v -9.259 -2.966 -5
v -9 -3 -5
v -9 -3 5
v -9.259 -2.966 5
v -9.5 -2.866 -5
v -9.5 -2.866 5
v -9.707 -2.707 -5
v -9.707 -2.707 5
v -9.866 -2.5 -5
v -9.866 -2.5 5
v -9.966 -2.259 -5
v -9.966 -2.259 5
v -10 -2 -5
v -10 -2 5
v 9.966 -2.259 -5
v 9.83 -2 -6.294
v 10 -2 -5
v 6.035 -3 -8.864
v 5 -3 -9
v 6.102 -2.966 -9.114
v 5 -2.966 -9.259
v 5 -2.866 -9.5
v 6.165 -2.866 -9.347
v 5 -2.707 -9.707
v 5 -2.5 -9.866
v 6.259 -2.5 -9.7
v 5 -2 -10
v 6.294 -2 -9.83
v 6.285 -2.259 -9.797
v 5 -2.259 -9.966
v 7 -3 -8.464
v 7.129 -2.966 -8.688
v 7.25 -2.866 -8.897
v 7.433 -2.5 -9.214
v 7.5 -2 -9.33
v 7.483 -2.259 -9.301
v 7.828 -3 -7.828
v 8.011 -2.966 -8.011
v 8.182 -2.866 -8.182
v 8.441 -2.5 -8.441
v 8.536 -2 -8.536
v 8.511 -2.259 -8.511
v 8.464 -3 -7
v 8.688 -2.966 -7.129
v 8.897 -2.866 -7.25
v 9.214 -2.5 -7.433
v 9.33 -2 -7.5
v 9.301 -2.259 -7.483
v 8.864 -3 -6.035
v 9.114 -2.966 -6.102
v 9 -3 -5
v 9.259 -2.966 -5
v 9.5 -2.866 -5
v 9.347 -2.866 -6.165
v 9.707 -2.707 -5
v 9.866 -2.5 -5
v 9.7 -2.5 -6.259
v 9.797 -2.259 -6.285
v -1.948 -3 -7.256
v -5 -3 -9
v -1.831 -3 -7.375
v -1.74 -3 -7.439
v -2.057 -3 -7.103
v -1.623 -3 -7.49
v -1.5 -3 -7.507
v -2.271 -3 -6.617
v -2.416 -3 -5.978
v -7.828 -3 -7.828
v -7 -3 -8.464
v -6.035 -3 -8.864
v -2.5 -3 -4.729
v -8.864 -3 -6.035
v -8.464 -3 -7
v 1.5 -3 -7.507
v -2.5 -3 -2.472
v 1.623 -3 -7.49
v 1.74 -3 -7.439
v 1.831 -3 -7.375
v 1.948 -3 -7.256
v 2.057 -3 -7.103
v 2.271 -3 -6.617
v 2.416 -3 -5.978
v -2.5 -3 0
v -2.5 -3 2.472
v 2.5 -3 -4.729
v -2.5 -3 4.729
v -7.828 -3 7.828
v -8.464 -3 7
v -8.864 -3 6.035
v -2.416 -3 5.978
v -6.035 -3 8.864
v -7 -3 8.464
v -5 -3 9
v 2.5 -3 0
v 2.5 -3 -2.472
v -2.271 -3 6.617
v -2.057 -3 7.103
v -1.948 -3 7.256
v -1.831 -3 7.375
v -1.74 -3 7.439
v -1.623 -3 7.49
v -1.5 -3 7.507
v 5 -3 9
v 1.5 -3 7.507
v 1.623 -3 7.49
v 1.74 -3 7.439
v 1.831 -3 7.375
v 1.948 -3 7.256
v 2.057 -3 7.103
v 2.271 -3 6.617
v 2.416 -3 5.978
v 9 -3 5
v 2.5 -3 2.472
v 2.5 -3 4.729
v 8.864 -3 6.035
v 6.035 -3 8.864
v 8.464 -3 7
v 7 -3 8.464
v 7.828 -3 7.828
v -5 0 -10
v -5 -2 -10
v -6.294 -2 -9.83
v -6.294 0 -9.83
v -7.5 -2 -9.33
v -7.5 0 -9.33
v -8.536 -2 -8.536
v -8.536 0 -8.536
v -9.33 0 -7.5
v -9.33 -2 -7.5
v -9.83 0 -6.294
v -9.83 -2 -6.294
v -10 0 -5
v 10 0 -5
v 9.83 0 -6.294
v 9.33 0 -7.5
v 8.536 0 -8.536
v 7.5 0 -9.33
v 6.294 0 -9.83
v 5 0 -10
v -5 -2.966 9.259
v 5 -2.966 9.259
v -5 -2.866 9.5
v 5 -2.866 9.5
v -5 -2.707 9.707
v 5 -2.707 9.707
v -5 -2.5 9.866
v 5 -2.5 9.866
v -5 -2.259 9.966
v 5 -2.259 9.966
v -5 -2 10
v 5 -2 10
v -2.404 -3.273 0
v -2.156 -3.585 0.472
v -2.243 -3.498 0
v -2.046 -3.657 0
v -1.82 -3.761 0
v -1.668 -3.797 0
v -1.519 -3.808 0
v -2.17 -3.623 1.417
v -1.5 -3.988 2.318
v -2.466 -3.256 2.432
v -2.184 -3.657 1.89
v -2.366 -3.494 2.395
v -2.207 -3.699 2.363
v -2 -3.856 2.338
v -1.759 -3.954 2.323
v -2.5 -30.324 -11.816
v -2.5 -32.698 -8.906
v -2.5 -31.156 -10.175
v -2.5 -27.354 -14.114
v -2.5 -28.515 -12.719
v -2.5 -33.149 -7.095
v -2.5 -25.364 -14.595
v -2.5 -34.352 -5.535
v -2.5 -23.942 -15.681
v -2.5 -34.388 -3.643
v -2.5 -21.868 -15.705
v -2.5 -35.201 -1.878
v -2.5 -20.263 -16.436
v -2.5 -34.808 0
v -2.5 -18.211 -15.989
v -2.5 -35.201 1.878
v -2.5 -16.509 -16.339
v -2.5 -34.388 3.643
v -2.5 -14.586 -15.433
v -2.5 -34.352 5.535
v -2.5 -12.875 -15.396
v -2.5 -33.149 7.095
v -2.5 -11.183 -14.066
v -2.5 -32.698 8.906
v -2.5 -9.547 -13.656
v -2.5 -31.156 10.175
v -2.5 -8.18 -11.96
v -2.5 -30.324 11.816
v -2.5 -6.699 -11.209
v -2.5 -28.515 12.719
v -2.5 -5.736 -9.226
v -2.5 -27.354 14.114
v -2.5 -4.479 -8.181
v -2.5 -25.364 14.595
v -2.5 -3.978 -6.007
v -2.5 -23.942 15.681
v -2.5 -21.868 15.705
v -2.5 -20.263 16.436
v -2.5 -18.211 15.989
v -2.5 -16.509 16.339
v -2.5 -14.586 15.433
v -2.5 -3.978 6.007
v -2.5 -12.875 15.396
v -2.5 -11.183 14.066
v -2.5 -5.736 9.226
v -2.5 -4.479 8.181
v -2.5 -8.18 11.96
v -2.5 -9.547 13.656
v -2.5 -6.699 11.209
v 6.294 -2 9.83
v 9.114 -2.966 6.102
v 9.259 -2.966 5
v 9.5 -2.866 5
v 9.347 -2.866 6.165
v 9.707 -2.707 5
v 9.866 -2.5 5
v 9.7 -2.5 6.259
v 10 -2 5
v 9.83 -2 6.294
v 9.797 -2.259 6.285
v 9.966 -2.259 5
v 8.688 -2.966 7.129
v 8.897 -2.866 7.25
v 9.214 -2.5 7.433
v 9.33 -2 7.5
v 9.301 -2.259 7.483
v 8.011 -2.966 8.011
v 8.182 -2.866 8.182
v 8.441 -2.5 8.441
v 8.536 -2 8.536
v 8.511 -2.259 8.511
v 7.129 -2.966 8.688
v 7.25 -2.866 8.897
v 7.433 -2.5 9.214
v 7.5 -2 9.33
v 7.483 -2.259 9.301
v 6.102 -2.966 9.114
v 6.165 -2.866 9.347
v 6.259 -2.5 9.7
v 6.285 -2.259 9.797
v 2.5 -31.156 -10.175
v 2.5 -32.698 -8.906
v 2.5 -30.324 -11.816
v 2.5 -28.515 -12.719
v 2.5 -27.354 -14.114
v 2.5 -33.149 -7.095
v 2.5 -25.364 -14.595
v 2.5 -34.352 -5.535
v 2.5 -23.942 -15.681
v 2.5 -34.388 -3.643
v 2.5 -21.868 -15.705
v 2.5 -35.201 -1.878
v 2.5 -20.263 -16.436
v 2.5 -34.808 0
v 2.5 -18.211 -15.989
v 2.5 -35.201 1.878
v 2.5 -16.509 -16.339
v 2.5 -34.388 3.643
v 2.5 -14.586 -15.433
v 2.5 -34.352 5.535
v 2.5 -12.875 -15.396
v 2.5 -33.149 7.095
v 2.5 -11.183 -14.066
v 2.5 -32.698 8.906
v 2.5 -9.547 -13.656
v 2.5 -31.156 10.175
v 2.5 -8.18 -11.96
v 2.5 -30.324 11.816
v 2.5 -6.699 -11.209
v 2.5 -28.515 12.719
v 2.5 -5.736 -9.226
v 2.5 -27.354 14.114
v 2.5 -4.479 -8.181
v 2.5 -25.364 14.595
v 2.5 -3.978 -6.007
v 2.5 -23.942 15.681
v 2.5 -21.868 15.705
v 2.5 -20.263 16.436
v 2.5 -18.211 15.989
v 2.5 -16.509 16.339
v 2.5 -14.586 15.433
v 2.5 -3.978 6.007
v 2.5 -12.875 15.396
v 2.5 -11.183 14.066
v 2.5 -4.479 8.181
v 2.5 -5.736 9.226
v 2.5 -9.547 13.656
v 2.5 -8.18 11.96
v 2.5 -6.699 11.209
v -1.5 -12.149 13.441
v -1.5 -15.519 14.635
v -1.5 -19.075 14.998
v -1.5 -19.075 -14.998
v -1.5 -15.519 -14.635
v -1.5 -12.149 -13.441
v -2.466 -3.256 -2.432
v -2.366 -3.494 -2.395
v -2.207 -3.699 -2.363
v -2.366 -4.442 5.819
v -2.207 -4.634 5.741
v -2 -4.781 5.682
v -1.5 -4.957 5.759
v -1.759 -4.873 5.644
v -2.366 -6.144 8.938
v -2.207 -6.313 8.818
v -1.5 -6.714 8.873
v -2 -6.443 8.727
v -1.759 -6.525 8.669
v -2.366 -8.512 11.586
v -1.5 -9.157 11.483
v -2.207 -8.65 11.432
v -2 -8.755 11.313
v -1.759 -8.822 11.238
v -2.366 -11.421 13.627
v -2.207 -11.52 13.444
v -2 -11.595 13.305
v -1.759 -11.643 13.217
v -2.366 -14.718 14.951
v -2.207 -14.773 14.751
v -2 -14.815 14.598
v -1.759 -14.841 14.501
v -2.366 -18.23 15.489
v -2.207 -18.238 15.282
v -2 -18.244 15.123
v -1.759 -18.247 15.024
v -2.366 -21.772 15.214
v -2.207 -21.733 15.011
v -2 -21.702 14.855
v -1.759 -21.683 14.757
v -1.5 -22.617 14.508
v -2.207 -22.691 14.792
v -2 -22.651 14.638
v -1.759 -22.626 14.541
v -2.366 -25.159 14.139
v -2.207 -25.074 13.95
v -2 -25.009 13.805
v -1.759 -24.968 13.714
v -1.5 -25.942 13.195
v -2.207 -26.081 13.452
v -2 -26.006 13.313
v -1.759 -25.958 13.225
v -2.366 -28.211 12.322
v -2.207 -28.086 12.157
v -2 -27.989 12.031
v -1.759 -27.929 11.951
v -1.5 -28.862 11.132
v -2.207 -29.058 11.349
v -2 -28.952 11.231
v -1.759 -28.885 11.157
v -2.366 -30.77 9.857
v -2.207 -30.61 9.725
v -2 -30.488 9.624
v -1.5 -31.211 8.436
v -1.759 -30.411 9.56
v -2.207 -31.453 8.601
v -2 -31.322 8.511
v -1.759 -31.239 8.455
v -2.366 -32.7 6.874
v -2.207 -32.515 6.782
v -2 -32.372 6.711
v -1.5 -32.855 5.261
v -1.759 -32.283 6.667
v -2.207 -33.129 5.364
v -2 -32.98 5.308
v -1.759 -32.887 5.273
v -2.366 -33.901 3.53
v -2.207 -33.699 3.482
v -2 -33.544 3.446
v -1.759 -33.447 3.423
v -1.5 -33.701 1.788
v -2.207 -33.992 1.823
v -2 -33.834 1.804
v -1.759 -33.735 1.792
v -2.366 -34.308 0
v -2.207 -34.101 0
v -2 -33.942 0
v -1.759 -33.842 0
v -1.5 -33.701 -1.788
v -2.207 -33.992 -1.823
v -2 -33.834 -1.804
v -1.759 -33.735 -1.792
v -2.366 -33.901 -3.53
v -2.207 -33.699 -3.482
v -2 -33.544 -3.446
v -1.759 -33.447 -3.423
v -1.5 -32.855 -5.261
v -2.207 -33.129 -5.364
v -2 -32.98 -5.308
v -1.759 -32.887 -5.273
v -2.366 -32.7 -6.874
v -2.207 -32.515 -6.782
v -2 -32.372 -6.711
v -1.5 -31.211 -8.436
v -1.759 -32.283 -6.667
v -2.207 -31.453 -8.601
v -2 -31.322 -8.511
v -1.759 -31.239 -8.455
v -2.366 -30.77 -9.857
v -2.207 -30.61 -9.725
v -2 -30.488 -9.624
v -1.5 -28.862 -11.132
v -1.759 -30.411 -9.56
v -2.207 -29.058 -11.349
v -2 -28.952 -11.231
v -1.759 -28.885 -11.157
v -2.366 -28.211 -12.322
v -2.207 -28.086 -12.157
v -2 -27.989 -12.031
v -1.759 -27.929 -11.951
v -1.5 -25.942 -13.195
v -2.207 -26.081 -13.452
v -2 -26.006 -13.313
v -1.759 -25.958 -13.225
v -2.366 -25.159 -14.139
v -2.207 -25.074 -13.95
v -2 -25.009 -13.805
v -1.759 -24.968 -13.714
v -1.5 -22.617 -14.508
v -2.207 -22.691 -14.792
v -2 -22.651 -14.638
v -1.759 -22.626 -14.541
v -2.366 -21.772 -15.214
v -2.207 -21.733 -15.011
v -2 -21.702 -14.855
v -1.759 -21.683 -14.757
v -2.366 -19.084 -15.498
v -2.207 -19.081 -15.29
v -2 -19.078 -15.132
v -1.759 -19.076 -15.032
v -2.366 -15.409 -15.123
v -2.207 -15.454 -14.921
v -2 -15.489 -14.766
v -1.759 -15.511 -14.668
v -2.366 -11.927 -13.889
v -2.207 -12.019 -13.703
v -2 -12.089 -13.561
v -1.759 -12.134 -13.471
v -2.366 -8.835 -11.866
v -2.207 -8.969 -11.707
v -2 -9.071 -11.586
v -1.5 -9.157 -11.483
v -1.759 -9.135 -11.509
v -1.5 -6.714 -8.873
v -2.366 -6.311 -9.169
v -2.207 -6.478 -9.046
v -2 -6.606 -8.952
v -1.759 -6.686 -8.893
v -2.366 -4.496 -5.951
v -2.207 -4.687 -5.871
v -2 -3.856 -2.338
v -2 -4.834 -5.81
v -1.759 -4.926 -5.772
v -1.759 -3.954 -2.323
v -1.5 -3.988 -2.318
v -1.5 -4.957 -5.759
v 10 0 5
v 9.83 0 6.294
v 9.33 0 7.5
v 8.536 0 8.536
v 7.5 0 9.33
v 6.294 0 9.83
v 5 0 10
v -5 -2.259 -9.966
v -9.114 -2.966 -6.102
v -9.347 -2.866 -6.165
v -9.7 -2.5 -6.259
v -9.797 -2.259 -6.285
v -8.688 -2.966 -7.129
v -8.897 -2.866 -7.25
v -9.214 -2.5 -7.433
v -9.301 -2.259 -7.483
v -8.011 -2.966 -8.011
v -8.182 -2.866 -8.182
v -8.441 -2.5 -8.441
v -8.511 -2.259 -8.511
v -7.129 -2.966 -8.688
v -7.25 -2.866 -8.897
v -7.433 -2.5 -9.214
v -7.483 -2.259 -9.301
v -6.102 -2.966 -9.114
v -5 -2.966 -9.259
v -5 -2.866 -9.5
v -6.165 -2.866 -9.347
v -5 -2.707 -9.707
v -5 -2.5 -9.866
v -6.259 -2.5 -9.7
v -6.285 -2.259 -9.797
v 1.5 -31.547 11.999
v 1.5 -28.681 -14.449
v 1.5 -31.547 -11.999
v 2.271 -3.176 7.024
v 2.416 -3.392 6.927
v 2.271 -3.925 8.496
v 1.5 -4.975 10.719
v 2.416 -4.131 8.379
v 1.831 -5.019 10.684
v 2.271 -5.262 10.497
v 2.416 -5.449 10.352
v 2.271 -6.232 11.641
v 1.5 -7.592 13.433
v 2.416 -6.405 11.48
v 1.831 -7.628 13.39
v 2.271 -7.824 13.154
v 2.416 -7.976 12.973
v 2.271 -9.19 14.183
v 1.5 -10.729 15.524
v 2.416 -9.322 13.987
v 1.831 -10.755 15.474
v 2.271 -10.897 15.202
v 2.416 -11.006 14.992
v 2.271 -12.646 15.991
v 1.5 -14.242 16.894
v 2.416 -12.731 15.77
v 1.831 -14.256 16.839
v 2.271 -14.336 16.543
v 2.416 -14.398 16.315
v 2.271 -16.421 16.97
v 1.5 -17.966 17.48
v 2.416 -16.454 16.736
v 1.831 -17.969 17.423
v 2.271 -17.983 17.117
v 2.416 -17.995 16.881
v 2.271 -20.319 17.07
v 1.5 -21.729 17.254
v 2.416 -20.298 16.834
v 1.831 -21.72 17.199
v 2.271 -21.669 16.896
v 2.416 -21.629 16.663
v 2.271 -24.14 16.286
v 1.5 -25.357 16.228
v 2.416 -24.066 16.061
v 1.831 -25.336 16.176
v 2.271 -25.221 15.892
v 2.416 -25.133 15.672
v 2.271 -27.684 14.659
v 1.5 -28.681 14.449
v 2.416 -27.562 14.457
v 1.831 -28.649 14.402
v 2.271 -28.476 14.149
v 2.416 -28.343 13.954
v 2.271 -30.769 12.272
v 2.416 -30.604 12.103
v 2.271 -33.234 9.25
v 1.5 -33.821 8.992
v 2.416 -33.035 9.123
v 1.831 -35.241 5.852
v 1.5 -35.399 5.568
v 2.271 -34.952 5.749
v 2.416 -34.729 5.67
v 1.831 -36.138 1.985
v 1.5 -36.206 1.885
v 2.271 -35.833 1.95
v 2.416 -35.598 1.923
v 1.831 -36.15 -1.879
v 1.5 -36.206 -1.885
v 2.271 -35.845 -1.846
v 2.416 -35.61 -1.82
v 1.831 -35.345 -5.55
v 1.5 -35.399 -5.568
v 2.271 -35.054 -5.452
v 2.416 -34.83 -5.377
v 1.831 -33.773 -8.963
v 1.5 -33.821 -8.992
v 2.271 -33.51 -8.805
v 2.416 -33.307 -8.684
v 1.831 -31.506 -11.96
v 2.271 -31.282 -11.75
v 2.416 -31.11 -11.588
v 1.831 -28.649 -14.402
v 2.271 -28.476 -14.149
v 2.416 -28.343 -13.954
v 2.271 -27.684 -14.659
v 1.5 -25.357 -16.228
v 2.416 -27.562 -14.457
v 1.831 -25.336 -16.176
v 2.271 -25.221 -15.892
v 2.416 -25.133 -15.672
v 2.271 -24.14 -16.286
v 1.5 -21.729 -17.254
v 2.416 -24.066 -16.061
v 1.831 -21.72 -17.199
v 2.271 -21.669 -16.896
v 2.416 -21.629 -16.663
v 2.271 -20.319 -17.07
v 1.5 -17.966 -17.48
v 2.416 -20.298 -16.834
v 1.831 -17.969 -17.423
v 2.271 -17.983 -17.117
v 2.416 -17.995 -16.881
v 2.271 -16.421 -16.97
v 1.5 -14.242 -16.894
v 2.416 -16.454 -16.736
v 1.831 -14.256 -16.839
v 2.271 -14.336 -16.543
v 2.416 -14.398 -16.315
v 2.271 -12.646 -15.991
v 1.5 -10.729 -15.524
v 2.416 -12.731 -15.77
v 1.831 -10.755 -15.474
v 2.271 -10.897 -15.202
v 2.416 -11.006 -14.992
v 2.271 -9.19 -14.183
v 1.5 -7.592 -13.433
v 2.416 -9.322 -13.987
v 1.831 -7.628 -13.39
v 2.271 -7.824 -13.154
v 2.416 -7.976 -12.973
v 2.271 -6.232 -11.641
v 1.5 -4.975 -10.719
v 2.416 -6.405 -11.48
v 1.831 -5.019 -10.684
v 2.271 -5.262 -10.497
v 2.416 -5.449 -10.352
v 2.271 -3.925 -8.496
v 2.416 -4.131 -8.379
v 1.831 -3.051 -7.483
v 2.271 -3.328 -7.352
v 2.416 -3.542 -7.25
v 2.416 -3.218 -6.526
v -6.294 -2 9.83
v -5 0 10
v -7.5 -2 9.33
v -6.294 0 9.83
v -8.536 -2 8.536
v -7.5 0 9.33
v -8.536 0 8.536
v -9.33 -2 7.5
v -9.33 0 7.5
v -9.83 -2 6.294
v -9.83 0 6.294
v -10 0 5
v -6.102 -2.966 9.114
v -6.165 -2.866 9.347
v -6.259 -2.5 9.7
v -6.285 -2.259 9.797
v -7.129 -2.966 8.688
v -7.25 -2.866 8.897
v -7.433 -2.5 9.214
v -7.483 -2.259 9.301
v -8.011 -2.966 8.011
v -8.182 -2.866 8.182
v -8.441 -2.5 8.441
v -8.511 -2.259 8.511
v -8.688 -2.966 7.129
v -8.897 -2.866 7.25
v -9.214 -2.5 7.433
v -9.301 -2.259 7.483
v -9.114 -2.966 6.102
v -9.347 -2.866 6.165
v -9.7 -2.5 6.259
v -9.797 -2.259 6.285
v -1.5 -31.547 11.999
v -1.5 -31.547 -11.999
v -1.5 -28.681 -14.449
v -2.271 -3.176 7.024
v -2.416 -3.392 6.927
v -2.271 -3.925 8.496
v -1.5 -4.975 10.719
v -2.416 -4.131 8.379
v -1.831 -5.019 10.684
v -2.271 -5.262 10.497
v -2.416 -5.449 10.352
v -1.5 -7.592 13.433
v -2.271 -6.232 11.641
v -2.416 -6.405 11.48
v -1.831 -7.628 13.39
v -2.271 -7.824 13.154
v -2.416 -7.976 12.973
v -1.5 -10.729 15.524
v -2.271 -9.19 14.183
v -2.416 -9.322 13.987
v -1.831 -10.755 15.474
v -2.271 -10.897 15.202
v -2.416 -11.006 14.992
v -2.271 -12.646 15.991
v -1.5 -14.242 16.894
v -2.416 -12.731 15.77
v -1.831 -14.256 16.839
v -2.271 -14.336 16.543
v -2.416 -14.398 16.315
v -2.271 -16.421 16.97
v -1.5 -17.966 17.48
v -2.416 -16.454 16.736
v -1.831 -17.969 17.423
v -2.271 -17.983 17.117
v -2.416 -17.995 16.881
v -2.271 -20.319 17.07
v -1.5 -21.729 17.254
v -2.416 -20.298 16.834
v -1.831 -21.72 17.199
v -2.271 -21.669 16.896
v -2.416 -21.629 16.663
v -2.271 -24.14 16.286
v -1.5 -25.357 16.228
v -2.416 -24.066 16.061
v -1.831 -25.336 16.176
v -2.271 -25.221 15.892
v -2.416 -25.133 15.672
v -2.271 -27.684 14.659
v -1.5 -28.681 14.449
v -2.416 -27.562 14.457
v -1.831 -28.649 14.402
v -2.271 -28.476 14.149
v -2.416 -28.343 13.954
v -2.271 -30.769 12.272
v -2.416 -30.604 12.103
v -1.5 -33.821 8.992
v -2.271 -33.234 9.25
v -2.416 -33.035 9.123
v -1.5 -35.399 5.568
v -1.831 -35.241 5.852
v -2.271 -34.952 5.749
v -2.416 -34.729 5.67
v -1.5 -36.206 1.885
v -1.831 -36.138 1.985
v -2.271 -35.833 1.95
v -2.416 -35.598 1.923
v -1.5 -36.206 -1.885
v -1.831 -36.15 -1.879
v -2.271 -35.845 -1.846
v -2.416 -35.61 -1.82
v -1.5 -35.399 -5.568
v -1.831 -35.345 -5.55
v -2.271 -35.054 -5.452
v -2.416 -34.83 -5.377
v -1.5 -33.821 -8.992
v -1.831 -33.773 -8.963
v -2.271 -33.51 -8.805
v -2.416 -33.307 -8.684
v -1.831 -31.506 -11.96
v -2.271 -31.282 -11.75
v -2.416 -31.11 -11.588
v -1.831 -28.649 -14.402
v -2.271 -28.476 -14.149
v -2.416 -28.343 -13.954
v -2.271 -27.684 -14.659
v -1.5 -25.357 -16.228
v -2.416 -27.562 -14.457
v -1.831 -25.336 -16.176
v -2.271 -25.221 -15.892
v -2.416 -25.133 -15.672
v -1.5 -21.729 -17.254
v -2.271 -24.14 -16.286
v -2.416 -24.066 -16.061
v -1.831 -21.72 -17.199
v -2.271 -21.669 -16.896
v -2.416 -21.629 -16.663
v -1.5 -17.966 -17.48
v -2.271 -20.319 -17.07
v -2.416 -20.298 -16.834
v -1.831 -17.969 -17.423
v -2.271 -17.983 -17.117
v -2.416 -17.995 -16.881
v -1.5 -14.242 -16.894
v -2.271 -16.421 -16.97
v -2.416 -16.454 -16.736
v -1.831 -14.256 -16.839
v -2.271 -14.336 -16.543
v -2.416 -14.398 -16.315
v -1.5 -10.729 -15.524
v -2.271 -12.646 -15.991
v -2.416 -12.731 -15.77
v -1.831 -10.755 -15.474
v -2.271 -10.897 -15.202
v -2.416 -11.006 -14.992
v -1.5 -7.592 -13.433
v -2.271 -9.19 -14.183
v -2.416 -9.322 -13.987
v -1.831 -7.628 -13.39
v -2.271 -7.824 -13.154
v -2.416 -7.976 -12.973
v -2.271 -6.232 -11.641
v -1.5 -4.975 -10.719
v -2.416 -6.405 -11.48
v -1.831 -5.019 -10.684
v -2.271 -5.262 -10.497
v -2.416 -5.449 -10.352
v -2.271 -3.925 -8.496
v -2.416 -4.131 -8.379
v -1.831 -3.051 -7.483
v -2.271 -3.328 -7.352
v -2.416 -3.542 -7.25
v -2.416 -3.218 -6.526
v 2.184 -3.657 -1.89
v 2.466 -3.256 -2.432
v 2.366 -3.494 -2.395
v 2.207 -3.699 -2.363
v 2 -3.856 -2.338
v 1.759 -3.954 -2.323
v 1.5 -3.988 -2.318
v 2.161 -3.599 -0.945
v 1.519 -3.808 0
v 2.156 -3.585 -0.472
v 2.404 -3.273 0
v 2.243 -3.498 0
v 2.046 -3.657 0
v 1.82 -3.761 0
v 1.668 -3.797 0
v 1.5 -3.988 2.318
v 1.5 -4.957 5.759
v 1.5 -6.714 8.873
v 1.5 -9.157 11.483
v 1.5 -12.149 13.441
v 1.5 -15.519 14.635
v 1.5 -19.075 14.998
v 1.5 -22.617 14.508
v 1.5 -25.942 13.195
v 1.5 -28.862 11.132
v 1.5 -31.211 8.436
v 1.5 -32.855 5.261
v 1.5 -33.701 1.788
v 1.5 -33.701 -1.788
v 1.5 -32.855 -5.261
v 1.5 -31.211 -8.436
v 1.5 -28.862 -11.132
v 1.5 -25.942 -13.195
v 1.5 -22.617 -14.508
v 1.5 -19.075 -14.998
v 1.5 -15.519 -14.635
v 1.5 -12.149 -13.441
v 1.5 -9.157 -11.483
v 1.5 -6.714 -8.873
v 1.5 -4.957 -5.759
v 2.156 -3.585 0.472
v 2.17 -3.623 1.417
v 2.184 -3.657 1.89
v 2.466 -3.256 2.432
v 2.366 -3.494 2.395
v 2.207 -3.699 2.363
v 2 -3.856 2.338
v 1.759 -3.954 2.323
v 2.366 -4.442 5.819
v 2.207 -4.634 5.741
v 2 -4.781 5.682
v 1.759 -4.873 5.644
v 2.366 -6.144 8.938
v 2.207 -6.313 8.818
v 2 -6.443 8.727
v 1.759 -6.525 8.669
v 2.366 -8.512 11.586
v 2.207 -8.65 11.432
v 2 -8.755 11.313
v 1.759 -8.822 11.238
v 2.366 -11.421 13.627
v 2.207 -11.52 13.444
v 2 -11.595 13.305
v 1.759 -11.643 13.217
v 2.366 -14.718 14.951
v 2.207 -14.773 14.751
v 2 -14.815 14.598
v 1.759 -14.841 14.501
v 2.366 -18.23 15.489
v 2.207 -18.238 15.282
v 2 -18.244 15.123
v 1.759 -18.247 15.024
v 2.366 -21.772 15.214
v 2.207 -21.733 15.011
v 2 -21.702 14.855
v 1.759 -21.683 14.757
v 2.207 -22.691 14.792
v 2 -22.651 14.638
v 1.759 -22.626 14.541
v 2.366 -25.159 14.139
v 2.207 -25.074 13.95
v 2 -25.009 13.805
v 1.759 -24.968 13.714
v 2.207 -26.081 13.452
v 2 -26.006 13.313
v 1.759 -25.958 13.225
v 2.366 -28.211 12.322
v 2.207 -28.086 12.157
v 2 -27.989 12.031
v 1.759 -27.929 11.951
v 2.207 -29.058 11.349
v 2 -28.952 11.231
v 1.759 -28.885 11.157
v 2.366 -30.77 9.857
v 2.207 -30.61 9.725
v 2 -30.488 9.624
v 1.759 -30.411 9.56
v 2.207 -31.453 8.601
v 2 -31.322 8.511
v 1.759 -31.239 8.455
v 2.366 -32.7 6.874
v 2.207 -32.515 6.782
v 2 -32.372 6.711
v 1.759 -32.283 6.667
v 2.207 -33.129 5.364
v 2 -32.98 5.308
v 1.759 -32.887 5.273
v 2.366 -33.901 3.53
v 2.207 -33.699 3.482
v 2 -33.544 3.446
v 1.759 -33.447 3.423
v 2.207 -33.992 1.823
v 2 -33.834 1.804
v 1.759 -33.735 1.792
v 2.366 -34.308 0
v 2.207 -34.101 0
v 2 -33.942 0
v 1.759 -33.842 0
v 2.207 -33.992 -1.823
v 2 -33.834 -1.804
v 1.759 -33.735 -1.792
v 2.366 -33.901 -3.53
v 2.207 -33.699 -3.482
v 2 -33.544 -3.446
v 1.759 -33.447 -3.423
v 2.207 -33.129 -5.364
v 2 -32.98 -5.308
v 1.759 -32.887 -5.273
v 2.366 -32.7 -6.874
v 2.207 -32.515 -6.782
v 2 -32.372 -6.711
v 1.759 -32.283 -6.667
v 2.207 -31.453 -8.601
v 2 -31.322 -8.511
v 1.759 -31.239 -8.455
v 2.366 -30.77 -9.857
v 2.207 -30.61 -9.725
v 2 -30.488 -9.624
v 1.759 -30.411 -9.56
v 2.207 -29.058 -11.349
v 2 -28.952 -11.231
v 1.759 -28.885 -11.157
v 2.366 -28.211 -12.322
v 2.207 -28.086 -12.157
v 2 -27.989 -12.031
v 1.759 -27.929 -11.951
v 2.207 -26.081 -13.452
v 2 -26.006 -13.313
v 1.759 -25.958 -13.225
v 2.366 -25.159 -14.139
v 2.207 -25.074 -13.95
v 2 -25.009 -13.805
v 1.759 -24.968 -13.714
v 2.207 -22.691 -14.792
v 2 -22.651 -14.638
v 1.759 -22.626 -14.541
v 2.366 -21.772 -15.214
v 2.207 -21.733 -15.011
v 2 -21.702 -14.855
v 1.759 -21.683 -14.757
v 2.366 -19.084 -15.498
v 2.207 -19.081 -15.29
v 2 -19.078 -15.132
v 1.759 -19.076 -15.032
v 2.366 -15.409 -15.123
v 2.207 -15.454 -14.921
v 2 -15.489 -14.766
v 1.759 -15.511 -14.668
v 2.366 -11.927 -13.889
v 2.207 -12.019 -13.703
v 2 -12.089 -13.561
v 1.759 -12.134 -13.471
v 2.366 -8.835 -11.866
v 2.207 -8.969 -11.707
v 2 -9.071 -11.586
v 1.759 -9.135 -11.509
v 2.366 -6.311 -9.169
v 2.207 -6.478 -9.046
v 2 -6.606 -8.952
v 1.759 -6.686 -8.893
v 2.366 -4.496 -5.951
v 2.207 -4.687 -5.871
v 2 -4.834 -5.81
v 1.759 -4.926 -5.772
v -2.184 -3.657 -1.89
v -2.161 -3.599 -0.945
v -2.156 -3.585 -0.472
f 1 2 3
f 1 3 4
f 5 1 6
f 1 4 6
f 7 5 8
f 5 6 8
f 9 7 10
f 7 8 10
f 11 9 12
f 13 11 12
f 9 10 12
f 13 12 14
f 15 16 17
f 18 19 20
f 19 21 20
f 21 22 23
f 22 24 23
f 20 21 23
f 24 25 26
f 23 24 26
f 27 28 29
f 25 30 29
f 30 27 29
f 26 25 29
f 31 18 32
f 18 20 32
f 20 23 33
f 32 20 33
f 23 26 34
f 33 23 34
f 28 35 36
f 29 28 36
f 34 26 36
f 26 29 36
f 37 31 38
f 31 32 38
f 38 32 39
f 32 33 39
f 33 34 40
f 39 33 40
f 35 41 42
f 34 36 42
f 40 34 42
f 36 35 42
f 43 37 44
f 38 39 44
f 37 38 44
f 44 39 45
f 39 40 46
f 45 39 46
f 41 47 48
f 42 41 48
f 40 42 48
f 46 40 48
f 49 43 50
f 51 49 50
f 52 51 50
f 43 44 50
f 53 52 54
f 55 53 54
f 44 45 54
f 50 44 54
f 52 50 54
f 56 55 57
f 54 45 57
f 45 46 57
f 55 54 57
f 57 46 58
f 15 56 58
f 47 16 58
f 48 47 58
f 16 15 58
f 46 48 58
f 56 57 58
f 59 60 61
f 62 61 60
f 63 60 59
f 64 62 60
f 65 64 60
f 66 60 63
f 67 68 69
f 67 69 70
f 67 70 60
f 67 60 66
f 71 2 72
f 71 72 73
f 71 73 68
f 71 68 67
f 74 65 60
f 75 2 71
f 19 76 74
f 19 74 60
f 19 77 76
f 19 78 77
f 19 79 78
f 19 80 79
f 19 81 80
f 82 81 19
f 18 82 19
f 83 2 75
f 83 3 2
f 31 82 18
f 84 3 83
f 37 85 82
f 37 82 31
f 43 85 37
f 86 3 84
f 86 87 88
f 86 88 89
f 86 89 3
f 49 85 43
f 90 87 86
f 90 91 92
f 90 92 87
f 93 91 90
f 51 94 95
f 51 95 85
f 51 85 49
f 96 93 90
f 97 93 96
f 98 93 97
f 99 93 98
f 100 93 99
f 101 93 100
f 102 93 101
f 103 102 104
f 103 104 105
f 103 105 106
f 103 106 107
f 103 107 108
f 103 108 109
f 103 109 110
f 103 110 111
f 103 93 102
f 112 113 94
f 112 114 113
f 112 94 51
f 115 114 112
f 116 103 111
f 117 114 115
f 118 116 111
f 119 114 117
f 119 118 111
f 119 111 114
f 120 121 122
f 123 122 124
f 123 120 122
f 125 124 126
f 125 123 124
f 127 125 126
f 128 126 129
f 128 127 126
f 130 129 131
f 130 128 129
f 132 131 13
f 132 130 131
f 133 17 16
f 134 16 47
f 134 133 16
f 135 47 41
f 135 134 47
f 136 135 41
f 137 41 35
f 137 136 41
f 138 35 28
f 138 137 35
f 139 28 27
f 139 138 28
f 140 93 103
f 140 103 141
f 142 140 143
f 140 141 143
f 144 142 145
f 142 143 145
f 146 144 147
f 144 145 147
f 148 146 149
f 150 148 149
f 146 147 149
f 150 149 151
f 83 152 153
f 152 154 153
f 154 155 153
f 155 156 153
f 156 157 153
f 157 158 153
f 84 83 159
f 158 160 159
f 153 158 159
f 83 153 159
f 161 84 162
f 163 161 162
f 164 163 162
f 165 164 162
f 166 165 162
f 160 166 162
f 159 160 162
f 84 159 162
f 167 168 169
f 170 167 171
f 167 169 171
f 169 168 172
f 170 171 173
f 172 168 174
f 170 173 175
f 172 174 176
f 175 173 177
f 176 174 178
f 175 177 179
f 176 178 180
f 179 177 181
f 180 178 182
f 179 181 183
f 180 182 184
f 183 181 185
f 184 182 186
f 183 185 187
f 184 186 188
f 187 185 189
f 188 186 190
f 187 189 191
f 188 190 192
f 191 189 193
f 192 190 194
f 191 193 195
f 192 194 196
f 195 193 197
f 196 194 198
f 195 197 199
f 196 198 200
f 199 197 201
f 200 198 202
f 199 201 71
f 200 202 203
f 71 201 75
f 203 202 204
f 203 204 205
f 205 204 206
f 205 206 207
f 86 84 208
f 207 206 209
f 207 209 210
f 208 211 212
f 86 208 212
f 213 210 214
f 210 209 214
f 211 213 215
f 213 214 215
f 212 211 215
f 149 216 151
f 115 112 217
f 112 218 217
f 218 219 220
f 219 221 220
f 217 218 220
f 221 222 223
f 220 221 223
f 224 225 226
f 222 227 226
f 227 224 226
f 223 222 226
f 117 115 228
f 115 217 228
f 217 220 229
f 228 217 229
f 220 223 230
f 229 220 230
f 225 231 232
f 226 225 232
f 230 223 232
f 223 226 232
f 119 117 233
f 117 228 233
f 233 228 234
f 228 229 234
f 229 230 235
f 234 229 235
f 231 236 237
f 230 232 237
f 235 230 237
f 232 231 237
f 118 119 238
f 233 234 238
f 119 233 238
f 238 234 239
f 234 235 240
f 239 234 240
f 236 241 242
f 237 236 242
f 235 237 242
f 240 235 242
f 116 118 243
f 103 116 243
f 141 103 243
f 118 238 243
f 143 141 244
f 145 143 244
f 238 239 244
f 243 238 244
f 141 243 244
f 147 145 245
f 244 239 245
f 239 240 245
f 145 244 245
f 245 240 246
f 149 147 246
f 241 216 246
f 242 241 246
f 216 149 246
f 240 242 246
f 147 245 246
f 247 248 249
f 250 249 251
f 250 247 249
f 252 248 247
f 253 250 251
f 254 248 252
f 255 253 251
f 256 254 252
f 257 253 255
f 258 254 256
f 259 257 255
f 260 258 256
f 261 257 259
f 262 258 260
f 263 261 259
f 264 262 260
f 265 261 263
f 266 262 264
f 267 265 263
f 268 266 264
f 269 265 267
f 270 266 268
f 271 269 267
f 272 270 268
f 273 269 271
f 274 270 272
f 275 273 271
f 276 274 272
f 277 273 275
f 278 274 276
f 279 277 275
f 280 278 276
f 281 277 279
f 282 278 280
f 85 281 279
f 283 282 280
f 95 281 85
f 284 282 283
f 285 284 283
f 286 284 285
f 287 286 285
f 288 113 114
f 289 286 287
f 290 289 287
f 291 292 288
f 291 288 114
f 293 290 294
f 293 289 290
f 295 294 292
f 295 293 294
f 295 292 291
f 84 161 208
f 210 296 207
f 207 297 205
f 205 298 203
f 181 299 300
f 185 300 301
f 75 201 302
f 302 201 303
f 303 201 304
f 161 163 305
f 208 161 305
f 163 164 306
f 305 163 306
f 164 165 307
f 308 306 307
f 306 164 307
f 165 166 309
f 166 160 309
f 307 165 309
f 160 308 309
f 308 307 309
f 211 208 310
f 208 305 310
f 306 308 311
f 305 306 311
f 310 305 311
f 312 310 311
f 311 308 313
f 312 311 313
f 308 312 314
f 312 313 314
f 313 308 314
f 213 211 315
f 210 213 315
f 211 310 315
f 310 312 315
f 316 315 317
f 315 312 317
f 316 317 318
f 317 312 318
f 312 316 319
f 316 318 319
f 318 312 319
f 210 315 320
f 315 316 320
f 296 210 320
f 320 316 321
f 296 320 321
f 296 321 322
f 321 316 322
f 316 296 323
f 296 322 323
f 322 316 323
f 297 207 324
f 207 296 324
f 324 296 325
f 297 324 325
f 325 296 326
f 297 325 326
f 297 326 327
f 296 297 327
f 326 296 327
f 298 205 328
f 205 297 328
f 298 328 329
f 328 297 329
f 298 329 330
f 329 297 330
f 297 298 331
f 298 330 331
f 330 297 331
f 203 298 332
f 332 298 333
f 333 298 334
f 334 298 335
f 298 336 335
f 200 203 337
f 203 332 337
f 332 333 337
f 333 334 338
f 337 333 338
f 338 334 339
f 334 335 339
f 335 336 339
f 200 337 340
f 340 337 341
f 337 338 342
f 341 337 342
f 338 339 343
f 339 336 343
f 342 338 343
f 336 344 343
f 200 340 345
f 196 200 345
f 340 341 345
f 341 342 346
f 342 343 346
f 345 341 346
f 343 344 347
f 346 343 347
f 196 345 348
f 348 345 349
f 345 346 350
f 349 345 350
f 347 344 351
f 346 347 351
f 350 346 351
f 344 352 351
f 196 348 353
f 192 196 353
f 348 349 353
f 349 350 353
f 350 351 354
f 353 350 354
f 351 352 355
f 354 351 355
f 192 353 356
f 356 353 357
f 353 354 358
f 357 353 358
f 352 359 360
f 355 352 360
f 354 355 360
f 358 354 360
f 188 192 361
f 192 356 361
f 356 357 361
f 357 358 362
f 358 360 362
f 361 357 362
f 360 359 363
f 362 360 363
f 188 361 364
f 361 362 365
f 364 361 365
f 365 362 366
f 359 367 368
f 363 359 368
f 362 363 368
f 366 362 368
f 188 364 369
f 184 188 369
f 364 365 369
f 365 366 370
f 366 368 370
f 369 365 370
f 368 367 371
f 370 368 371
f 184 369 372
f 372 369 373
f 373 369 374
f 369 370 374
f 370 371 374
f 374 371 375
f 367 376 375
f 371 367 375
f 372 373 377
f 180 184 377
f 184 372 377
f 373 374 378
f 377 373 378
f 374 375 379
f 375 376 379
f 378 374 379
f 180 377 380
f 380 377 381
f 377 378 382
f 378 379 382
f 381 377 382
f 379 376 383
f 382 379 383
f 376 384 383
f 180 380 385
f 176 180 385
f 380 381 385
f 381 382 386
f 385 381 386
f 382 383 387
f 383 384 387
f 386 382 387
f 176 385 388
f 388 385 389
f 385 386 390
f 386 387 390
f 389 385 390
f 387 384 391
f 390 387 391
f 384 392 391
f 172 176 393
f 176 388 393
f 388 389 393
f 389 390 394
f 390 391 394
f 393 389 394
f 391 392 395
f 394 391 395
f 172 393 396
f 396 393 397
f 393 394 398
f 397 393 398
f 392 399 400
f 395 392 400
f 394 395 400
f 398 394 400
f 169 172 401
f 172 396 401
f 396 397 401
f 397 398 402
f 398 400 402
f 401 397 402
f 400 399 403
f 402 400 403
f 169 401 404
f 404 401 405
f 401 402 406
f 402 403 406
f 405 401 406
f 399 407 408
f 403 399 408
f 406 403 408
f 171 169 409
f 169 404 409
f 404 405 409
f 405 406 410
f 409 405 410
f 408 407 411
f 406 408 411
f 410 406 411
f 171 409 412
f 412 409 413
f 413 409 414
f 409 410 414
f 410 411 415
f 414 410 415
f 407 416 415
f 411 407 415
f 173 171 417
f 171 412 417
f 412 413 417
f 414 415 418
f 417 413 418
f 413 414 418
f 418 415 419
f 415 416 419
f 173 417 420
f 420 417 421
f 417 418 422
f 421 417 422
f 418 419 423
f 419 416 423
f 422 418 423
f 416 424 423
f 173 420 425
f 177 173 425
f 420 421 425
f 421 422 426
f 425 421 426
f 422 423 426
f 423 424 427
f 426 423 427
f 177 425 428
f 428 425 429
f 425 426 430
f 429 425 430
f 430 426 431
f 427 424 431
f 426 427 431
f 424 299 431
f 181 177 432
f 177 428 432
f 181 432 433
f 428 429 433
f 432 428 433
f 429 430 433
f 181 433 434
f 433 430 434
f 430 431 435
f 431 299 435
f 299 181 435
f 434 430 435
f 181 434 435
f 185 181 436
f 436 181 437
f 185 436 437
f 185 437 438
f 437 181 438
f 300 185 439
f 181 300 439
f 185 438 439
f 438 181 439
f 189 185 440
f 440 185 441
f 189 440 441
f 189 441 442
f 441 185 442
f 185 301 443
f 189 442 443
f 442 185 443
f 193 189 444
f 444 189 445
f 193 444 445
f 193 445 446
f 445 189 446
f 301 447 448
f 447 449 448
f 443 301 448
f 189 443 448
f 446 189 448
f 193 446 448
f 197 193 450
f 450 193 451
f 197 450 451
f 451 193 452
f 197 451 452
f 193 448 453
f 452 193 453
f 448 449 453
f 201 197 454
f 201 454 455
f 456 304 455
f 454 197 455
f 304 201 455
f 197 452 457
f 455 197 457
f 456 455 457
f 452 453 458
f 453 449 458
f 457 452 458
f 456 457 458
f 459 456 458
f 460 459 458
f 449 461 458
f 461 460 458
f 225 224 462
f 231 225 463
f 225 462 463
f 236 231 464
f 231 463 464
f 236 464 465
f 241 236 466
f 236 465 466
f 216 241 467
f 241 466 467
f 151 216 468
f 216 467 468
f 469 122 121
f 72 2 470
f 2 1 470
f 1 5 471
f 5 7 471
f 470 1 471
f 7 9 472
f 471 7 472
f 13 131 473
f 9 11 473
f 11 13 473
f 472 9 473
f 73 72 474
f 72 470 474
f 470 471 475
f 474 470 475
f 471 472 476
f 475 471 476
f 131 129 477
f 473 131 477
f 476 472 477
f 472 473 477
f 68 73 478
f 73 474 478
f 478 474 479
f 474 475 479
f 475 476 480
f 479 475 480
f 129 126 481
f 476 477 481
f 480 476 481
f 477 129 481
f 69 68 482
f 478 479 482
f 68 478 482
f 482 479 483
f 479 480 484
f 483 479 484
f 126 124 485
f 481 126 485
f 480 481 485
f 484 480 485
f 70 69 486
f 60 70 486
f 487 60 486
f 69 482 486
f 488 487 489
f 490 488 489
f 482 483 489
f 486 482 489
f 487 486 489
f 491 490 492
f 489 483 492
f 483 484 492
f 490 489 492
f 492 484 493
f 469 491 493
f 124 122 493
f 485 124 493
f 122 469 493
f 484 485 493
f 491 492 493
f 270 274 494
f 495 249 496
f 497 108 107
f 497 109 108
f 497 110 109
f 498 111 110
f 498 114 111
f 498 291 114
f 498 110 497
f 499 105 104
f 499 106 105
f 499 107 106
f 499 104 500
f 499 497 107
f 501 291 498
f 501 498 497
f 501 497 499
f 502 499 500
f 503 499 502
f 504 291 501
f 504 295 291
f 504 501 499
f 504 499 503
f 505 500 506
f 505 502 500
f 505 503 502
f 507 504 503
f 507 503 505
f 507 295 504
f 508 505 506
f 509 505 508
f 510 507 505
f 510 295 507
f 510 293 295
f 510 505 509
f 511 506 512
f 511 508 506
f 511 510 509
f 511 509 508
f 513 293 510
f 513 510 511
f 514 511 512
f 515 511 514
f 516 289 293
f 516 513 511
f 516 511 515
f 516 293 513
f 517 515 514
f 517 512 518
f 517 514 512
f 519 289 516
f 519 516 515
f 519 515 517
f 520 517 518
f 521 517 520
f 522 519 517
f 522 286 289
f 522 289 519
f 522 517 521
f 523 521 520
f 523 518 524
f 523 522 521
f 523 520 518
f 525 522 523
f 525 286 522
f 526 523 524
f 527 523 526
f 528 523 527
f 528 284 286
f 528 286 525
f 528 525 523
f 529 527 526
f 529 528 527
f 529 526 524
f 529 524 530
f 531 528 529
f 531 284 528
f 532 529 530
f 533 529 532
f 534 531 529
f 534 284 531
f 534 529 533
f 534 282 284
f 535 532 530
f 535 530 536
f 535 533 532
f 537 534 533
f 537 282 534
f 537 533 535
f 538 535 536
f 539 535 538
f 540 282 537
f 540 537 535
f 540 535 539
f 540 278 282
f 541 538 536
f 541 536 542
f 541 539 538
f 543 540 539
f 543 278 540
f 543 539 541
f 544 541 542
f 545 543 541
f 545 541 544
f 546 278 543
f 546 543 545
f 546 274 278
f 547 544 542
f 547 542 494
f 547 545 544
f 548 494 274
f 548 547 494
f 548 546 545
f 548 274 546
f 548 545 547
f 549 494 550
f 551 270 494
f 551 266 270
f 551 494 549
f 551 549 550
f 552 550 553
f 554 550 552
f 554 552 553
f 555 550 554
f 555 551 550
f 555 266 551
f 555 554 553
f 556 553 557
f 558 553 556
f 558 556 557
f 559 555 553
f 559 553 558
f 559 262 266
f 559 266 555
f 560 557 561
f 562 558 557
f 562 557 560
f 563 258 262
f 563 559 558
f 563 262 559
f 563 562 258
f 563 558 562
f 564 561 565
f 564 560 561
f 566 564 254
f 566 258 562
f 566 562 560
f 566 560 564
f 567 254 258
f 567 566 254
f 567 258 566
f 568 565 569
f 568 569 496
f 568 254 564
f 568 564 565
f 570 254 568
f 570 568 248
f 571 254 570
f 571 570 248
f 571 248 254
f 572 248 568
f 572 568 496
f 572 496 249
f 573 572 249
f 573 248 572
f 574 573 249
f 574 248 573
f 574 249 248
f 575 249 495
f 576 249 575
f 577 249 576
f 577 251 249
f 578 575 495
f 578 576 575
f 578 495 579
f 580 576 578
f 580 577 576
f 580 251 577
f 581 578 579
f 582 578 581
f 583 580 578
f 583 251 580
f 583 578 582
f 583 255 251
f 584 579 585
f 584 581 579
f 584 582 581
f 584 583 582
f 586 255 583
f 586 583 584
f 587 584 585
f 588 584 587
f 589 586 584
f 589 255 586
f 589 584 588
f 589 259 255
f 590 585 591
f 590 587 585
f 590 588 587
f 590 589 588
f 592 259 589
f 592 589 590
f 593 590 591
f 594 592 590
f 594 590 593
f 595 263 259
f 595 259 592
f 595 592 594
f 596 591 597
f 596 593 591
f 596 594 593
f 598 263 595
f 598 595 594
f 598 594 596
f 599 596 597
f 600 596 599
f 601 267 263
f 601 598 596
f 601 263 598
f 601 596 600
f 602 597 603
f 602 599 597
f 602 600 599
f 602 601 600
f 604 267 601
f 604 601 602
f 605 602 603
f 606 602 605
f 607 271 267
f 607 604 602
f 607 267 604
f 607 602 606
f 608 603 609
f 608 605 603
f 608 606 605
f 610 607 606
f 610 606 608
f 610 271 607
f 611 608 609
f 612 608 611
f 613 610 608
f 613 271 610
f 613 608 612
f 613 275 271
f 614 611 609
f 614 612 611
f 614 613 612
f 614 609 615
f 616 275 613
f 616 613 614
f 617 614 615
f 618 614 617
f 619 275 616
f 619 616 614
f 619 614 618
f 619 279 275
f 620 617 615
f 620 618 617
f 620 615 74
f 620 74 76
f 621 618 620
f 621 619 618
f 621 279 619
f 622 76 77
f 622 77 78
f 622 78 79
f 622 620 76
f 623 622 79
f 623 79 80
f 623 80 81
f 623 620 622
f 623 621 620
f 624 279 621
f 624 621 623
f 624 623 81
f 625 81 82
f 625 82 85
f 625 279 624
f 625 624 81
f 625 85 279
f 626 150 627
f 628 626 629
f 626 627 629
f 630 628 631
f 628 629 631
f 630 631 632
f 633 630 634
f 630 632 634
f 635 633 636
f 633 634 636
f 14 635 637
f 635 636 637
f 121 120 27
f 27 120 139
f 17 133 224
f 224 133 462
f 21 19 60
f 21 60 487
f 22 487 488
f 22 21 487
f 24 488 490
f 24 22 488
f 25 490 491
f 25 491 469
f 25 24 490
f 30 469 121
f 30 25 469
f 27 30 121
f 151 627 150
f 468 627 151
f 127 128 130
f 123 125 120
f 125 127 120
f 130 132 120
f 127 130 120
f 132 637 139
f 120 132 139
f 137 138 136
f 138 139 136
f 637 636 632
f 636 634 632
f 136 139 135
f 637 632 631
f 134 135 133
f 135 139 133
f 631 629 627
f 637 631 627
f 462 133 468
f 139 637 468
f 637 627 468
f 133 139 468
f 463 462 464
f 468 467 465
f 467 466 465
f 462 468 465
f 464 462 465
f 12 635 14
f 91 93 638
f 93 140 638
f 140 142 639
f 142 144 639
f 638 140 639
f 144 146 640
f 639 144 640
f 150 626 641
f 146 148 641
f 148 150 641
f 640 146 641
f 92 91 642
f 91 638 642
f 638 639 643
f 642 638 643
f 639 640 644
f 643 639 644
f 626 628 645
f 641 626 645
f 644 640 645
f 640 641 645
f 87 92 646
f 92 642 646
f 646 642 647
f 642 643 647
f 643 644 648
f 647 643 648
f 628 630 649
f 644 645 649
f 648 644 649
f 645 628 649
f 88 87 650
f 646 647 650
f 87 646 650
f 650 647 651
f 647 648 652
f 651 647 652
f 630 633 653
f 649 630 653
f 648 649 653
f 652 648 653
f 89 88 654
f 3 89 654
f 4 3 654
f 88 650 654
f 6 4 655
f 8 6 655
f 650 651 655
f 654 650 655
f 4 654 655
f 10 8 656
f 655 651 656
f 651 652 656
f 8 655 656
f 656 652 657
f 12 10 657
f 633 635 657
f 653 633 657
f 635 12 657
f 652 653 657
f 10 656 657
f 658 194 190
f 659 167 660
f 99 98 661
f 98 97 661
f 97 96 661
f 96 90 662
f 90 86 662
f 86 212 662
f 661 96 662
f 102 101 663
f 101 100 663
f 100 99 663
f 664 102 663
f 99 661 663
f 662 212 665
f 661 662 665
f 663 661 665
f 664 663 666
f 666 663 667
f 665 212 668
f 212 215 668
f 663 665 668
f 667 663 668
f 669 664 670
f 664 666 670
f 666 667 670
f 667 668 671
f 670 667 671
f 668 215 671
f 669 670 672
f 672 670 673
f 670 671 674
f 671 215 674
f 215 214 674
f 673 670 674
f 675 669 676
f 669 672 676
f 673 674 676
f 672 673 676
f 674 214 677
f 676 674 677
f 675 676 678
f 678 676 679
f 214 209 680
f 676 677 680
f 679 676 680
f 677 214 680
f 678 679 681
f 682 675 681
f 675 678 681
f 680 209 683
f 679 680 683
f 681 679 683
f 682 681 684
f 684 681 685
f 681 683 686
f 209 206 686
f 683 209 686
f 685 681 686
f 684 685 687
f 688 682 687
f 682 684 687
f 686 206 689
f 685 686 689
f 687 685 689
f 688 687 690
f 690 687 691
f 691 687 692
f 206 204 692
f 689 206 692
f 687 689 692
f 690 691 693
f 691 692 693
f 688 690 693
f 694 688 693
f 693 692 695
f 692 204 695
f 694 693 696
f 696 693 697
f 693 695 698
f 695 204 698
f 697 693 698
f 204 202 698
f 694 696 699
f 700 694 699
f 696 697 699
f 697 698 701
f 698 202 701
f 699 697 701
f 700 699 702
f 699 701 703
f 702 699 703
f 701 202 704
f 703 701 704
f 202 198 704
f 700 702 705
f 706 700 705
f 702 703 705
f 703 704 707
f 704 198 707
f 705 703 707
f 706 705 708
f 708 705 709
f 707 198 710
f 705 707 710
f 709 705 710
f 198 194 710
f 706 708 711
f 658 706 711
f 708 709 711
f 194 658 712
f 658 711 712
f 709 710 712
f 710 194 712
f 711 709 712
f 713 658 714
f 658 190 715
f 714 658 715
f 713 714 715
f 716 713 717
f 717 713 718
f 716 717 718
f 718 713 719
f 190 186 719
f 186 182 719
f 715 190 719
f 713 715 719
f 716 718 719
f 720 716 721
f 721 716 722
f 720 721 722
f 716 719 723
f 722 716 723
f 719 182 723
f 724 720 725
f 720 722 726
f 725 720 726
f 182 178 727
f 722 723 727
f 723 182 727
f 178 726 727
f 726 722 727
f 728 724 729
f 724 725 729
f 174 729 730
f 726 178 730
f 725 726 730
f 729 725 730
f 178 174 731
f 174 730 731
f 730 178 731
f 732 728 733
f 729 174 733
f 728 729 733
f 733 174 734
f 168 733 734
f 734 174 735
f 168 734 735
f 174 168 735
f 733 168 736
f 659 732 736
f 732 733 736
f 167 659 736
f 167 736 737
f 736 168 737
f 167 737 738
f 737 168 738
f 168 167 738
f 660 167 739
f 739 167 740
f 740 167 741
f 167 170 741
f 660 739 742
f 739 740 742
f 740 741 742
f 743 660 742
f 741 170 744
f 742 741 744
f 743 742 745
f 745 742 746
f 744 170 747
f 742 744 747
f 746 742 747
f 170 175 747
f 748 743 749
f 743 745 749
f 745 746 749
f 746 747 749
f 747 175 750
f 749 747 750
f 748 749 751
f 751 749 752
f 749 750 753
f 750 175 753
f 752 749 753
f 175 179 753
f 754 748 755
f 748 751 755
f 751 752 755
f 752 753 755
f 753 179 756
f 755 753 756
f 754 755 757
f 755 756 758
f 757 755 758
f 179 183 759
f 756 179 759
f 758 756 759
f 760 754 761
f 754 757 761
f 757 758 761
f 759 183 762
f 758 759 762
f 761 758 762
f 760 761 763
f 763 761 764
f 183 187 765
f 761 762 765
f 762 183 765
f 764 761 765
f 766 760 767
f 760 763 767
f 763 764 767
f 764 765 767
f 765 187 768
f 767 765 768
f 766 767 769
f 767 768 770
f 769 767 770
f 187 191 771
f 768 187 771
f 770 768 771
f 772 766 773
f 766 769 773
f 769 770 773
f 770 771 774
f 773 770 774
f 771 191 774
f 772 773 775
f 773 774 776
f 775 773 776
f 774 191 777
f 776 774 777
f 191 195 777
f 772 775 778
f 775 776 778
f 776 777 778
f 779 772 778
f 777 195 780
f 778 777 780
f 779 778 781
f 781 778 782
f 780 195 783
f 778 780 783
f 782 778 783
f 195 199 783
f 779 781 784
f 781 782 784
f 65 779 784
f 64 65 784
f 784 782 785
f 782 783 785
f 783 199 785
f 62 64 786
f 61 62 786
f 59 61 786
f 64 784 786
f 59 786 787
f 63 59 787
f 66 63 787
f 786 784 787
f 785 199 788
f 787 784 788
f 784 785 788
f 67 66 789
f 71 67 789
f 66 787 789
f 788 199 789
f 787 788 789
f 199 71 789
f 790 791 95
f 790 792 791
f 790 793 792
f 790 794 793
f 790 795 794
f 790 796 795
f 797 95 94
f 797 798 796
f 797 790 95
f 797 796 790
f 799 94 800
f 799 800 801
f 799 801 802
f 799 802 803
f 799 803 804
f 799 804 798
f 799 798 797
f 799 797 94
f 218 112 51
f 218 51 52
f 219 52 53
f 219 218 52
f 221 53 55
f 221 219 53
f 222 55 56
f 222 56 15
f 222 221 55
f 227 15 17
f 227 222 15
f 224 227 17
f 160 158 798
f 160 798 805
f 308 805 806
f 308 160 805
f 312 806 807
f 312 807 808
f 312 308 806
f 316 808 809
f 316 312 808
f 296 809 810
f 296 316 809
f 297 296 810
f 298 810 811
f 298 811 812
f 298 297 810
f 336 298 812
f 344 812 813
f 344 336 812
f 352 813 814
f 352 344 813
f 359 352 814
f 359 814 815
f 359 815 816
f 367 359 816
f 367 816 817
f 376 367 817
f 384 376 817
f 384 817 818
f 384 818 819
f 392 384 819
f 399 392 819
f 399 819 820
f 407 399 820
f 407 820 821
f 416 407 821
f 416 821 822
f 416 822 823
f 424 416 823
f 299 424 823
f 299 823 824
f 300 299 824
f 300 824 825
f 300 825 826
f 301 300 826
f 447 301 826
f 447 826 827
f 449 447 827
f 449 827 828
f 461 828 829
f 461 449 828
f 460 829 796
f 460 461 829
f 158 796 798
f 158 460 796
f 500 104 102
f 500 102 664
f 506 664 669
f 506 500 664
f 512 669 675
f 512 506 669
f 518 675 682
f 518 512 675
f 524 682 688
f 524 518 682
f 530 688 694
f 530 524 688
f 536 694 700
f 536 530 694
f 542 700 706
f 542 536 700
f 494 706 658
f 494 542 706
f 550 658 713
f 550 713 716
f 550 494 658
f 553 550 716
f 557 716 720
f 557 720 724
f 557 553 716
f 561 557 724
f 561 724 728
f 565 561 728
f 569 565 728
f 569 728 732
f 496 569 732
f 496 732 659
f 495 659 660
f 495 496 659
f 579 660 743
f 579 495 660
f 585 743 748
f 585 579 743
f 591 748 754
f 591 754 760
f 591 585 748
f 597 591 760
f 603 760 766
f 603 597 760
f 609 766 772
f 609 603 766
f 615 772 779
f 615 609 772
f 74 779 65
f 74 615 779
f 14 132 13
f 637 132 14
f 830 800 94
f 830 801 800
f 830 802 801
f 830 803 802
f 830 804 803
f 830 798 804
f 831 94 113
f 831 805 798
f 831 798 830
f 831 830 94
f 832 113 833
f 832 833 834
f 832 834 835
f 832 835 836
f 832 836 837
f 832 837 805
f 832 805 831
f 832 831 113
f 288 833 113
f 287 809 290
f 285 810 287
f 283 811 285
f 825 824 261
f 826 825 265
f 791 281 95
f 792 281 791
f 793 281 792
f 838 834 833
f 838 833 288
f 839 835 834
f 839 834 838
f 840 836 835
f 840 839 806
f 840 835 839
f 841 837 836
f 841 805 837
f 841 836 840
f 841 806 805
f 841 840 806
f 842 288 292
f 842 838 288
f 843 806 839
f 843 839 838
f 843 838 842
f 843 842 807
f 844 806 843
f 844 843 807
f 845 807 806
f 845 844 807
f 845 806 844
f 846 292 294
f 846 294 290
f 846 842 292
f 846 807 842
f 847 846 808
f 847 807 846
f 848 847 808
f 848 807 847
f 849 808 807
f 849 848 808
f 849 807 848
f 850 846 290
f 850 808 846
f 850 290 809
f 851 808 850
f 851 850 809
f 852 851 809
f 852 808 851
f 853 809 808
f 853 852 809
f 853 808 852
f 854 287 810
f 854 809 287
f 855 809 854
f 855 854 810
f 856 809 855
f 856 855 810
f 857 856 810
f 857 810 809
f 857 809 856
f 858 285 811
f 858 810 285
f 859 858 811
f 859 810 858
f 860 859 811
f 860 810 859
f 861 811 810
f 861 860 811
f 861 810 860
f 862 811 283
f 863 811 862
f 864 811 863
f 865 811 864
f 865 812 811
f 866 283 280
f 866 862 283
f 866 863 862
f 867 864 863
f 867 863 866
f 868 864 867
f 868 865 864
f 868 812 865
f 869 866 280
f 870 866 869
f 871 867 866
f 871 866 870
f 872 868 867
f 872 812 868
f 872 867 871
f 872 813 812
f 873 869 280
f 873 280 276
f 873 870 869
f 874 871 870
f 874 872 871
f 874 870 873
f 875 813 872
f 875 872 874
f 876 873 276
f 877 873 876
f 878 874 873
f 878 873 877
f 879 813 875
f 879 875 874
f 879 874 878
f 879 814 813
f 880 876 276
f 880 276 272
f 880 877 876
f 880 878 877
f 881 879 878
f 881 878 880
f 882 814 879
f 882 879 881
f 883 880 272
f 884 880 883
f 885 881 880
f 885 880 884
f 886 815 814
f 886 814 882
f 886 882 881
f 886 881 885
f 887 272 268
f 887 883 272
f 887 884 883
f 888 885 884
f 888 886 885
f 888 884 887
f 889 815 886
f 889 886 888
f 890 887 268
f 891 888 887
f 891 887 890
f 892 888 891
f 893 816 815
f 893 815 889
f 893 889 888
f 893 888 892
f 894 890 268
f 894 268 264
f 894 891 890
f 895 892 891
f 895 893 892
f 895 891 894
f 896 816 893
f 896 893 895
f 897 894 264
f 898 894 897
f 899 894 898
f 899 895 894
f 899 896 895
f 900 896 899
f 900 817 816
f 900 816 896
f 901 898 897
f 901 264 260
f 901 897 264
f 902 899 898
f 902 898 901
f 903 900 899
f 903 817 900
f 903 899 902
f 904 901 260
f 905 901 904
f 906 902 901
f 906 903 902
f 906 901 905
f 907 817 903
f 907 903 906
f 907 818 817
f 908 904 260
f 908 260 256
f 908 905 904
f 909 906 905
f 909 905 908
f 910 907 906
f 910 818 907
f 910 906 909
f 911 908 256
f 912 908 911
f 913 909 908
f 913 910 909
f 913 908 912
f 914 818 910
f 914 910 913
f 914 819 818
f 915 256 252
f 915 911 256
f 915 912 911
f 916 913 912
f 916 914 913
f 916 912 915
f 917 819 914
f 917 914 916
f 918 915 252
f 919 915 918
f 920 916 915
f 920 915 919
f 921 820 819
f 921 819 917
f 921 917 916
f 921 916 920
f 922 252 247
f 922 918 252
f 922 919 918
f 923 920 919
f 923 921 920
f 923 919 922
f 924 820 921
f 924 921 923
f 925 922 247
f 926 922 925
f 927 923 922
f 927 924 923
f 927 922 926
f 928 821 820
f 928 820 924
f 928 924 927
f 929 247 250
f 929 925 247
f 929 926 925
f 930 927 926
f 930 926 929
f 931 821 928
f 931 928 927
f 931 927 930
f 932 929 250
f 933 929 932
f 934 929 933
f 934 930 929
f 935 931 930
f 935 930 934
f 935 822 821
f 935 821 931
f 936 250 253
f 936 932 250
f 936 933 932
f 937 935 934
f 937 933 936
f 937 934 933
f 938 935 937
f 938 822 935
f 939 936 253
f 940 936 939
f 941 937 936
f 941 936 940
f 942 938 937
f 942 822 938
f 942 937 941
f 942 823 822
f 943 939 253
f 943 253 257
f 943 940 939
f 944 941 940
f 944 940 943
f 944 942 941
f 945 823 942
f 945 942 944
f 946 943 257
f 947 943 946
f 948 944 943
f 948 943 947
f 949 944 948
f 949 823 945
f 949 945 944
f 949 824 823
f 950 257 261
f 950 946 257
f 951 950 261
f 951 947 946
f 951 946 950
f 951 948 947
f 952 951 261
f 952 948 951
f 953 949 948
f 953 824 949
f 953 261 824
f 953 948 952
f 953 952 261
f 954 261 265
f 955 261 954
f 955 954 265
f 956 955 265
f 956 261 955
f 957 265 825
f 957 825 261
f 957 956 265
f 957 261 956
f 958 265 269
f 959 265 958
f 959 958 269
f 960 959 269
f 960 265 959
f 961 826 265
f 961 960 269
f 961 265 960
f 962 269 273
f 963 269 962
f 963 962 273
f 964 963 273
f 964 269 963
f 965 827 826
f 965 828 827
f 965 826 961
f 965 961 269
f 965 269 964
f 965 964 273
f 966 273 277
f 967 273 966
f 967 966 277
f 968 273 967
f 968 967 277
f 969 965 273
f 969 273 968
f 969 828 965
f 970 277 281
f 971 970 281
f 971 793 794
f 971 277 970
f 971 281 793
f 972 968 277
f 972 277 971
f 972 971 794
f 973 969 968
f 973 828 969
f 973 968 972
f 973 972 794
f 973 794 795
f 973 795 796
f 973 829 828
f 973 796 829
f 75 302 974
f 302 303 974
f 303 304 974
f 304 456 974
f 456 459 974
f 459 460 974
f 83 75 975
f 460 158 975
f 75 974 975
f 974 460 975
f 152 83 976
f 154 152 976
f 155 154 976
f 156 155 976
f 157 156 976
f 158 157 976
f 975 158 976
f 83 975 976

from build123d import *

# Parameters (mm, degrees)
F0_W         = 20
F0_H         = 20
F1_DEPTH     = 3
F2_R         = 17.5
F2_R_2       = 15
F3_DEPTH     = 2.5
F4_R         = 1
F5_T1_DEPTH  = 15.5
F5_T4_ANGLE  = 90
F5_T6_ANGLE  = 90
F5_T8_ANGLE  = 90
F5_T10_ANGLE = 90


# Not quite as in the source:
# - a fillet or chamfer that OpenCascade refuses, or shapes differently, is made with other operations: its cross-section is extruded or revolved along the edge and cut away or added


with BuildPart() as f1:
    # F0 (on Front) → F1 (new body)
    with BuildSketch(Plane.XZ):
        Rectangle(F0_W, F0_H)
    extrude(amount=F1_DEPTH)

    # F2 (on Right) → F3 (join, symmetric)
    with BuildSketch(Plane.YZ):
        with Locations((-18.8078675419, 0)):
            Circle(F2_R)
        with Locations((-18.8078675419, 0)):
            Circle(F2_R_2, mode=Mode.SUBTRACT)
    extrude(amount=F3_DEPTH, both=True)

    # F4 (call 1 of 5: OpenCascade refuses the feature's edges together)
    f4_edges = [f1.edges().sort_by_distance(p)[0] for p in [
        (2.5, -36.307868, 0),
    ]]
    fillet(f4_edges, radius=F4_R)

    # F4#2 (call 2 of 5)
    f4_2_edges = [f1.edges().sort_by_distance(p)[0] for p in [
        (-2.5, -36.307868, 0),
    ]]
    fillet(f4_2_edges, radius=F4_R)

    # F4#3 (call 3 of 5)
    f4_3_edges = [f1.edges().sort_by_distance(p)[0] for p in [
        (-2.5, -33.807868, 0),
    ]]
    fillet(f4_3_edges, radius=F4_R)

    # F4#4 (call 4 of 5)
    f4_4_edges = [f1.edges().sort_by_distance(p)[0] for p in [
        (2.5, -33.807868, 0),
    ]]
    fillet(f4_4_edges, radius=F4_R)

    # F4#5 (call 5 of 5)
    f4_5_edges = [f1.edges().sort_by_distance(p)[0] for p in [
        (10, -3, 0),
        (0, -3, 10),
        (-10, -3, 0),
        (0, -3, -10),
    ]]
    fillet(f4_5_edges, radius=F4_R)

    # F5: fillet of radius 5 on 4 edges, made by hand

    # F5_s2 → F5_t1 (cut)
    with BuildSketch(Plane.XZ.offset(-12.5)):
        with BuildLine():
            ThreePointArc((-5, 10), (-8.5355339059, 8.5355339059), (-10, 5))
            Line((-10, 5), (-10, 10))
            Line((-10, 10), (-5, 10))
        make_face()
        with BuildLine():
            ThreePointArc((-5, -10), (-8.5355339059, -8.5355339059), (-10, -5))
            Line((-10, -5), (-10, -10))
            Line((-10, -10), (-5, -10))
        make_face()
        with BuildLine():
            ThreePointArc((10, 5), (8.5355339059, 8.5355339059), (5, 10))
            Line((5, 10), (10, 10))
            Line((10, 10), (10, 5))
        make_face()
        with BuildLine():
            ThreePointArc((10, -5), (8.5355339059, -8.5355339059), (5, -10))
            Line((5, -10), (10, -10))
            Line((10, -10), (10, -5))
        make_face()
    extrude(amount=F5_T1_DEPTH, mode=Mode.SUBTRACT)

    # F5_s3 → F5_t4 (revolve, cut)
    with BuildSketch(Plane.YZ.offset(5)):
        with BuildLine():
            ThreePointArc((-3, -9), (-2.7071067812, -9.7071067812), (-2, -10))
            Line((-2, -10), (-3, -10))
            Line((-3, -10), (-3, -9))
        make_face()
    revolve(axis=Axis((5, -3, -5), (0, -1, 0)), revolution_arc=F5_T4_ANGLE, mode=Mode.SUBTRACT)

    # F5_s5 → F5_t6 (revolve, cut)
    with BuildSketch(Plane.XY.offset(5)):
        with BuildLine():
            ThreePointArc((9, -3), (9.7071067812, -2.7071067812), (10, -2))
            Line((10, -2), (10, -3))
            Line((10, -3), (9, -3))
        make_face()
    revolve(axis=Axis((5, -3, 5), (0, -1, 0)), revolution_arc=F5_T6_ANGLE, mode=Mode.SUBTRACT)

    # F5_s7 → F5_t8 (revolve, cut)
    with BuildSketch(Plane.XY.offset(-5)):
        with BuildLine():
            ThreePointArc((-9, -3), (-9.7071067812, -2.7071067812), (-10, -2))
            Line((-10, -2), (-10, -3))
            Line((-10, -3), (-9, -3))
        make_face()
    revolve(axis=Axis((-5, -3, -5), (0, -1, 0)), revolution_arc=F5_T8_ANGLE, mode=Mode.SUBTRACT)

    # F5_s9 → F5_t10 (revolve, cut)
    with BuildSketch(Plane.YZ.offset(-5)):
        with BuildLine():
            ThreePointArc((-3, 9), (-2.7071067812, 9.7071067812), (-2, 10))
            Line((-2, 10), (-3, 10))
            Line((-3, 10), (-3, 9))
        make_face()
    revolve(axis=Axis((-5, -3, 5), (0, -1, 0)), revolution_arc=F5_T10_ANGLE, mode=Mode.SUBTRACT)


solid = f1.part
